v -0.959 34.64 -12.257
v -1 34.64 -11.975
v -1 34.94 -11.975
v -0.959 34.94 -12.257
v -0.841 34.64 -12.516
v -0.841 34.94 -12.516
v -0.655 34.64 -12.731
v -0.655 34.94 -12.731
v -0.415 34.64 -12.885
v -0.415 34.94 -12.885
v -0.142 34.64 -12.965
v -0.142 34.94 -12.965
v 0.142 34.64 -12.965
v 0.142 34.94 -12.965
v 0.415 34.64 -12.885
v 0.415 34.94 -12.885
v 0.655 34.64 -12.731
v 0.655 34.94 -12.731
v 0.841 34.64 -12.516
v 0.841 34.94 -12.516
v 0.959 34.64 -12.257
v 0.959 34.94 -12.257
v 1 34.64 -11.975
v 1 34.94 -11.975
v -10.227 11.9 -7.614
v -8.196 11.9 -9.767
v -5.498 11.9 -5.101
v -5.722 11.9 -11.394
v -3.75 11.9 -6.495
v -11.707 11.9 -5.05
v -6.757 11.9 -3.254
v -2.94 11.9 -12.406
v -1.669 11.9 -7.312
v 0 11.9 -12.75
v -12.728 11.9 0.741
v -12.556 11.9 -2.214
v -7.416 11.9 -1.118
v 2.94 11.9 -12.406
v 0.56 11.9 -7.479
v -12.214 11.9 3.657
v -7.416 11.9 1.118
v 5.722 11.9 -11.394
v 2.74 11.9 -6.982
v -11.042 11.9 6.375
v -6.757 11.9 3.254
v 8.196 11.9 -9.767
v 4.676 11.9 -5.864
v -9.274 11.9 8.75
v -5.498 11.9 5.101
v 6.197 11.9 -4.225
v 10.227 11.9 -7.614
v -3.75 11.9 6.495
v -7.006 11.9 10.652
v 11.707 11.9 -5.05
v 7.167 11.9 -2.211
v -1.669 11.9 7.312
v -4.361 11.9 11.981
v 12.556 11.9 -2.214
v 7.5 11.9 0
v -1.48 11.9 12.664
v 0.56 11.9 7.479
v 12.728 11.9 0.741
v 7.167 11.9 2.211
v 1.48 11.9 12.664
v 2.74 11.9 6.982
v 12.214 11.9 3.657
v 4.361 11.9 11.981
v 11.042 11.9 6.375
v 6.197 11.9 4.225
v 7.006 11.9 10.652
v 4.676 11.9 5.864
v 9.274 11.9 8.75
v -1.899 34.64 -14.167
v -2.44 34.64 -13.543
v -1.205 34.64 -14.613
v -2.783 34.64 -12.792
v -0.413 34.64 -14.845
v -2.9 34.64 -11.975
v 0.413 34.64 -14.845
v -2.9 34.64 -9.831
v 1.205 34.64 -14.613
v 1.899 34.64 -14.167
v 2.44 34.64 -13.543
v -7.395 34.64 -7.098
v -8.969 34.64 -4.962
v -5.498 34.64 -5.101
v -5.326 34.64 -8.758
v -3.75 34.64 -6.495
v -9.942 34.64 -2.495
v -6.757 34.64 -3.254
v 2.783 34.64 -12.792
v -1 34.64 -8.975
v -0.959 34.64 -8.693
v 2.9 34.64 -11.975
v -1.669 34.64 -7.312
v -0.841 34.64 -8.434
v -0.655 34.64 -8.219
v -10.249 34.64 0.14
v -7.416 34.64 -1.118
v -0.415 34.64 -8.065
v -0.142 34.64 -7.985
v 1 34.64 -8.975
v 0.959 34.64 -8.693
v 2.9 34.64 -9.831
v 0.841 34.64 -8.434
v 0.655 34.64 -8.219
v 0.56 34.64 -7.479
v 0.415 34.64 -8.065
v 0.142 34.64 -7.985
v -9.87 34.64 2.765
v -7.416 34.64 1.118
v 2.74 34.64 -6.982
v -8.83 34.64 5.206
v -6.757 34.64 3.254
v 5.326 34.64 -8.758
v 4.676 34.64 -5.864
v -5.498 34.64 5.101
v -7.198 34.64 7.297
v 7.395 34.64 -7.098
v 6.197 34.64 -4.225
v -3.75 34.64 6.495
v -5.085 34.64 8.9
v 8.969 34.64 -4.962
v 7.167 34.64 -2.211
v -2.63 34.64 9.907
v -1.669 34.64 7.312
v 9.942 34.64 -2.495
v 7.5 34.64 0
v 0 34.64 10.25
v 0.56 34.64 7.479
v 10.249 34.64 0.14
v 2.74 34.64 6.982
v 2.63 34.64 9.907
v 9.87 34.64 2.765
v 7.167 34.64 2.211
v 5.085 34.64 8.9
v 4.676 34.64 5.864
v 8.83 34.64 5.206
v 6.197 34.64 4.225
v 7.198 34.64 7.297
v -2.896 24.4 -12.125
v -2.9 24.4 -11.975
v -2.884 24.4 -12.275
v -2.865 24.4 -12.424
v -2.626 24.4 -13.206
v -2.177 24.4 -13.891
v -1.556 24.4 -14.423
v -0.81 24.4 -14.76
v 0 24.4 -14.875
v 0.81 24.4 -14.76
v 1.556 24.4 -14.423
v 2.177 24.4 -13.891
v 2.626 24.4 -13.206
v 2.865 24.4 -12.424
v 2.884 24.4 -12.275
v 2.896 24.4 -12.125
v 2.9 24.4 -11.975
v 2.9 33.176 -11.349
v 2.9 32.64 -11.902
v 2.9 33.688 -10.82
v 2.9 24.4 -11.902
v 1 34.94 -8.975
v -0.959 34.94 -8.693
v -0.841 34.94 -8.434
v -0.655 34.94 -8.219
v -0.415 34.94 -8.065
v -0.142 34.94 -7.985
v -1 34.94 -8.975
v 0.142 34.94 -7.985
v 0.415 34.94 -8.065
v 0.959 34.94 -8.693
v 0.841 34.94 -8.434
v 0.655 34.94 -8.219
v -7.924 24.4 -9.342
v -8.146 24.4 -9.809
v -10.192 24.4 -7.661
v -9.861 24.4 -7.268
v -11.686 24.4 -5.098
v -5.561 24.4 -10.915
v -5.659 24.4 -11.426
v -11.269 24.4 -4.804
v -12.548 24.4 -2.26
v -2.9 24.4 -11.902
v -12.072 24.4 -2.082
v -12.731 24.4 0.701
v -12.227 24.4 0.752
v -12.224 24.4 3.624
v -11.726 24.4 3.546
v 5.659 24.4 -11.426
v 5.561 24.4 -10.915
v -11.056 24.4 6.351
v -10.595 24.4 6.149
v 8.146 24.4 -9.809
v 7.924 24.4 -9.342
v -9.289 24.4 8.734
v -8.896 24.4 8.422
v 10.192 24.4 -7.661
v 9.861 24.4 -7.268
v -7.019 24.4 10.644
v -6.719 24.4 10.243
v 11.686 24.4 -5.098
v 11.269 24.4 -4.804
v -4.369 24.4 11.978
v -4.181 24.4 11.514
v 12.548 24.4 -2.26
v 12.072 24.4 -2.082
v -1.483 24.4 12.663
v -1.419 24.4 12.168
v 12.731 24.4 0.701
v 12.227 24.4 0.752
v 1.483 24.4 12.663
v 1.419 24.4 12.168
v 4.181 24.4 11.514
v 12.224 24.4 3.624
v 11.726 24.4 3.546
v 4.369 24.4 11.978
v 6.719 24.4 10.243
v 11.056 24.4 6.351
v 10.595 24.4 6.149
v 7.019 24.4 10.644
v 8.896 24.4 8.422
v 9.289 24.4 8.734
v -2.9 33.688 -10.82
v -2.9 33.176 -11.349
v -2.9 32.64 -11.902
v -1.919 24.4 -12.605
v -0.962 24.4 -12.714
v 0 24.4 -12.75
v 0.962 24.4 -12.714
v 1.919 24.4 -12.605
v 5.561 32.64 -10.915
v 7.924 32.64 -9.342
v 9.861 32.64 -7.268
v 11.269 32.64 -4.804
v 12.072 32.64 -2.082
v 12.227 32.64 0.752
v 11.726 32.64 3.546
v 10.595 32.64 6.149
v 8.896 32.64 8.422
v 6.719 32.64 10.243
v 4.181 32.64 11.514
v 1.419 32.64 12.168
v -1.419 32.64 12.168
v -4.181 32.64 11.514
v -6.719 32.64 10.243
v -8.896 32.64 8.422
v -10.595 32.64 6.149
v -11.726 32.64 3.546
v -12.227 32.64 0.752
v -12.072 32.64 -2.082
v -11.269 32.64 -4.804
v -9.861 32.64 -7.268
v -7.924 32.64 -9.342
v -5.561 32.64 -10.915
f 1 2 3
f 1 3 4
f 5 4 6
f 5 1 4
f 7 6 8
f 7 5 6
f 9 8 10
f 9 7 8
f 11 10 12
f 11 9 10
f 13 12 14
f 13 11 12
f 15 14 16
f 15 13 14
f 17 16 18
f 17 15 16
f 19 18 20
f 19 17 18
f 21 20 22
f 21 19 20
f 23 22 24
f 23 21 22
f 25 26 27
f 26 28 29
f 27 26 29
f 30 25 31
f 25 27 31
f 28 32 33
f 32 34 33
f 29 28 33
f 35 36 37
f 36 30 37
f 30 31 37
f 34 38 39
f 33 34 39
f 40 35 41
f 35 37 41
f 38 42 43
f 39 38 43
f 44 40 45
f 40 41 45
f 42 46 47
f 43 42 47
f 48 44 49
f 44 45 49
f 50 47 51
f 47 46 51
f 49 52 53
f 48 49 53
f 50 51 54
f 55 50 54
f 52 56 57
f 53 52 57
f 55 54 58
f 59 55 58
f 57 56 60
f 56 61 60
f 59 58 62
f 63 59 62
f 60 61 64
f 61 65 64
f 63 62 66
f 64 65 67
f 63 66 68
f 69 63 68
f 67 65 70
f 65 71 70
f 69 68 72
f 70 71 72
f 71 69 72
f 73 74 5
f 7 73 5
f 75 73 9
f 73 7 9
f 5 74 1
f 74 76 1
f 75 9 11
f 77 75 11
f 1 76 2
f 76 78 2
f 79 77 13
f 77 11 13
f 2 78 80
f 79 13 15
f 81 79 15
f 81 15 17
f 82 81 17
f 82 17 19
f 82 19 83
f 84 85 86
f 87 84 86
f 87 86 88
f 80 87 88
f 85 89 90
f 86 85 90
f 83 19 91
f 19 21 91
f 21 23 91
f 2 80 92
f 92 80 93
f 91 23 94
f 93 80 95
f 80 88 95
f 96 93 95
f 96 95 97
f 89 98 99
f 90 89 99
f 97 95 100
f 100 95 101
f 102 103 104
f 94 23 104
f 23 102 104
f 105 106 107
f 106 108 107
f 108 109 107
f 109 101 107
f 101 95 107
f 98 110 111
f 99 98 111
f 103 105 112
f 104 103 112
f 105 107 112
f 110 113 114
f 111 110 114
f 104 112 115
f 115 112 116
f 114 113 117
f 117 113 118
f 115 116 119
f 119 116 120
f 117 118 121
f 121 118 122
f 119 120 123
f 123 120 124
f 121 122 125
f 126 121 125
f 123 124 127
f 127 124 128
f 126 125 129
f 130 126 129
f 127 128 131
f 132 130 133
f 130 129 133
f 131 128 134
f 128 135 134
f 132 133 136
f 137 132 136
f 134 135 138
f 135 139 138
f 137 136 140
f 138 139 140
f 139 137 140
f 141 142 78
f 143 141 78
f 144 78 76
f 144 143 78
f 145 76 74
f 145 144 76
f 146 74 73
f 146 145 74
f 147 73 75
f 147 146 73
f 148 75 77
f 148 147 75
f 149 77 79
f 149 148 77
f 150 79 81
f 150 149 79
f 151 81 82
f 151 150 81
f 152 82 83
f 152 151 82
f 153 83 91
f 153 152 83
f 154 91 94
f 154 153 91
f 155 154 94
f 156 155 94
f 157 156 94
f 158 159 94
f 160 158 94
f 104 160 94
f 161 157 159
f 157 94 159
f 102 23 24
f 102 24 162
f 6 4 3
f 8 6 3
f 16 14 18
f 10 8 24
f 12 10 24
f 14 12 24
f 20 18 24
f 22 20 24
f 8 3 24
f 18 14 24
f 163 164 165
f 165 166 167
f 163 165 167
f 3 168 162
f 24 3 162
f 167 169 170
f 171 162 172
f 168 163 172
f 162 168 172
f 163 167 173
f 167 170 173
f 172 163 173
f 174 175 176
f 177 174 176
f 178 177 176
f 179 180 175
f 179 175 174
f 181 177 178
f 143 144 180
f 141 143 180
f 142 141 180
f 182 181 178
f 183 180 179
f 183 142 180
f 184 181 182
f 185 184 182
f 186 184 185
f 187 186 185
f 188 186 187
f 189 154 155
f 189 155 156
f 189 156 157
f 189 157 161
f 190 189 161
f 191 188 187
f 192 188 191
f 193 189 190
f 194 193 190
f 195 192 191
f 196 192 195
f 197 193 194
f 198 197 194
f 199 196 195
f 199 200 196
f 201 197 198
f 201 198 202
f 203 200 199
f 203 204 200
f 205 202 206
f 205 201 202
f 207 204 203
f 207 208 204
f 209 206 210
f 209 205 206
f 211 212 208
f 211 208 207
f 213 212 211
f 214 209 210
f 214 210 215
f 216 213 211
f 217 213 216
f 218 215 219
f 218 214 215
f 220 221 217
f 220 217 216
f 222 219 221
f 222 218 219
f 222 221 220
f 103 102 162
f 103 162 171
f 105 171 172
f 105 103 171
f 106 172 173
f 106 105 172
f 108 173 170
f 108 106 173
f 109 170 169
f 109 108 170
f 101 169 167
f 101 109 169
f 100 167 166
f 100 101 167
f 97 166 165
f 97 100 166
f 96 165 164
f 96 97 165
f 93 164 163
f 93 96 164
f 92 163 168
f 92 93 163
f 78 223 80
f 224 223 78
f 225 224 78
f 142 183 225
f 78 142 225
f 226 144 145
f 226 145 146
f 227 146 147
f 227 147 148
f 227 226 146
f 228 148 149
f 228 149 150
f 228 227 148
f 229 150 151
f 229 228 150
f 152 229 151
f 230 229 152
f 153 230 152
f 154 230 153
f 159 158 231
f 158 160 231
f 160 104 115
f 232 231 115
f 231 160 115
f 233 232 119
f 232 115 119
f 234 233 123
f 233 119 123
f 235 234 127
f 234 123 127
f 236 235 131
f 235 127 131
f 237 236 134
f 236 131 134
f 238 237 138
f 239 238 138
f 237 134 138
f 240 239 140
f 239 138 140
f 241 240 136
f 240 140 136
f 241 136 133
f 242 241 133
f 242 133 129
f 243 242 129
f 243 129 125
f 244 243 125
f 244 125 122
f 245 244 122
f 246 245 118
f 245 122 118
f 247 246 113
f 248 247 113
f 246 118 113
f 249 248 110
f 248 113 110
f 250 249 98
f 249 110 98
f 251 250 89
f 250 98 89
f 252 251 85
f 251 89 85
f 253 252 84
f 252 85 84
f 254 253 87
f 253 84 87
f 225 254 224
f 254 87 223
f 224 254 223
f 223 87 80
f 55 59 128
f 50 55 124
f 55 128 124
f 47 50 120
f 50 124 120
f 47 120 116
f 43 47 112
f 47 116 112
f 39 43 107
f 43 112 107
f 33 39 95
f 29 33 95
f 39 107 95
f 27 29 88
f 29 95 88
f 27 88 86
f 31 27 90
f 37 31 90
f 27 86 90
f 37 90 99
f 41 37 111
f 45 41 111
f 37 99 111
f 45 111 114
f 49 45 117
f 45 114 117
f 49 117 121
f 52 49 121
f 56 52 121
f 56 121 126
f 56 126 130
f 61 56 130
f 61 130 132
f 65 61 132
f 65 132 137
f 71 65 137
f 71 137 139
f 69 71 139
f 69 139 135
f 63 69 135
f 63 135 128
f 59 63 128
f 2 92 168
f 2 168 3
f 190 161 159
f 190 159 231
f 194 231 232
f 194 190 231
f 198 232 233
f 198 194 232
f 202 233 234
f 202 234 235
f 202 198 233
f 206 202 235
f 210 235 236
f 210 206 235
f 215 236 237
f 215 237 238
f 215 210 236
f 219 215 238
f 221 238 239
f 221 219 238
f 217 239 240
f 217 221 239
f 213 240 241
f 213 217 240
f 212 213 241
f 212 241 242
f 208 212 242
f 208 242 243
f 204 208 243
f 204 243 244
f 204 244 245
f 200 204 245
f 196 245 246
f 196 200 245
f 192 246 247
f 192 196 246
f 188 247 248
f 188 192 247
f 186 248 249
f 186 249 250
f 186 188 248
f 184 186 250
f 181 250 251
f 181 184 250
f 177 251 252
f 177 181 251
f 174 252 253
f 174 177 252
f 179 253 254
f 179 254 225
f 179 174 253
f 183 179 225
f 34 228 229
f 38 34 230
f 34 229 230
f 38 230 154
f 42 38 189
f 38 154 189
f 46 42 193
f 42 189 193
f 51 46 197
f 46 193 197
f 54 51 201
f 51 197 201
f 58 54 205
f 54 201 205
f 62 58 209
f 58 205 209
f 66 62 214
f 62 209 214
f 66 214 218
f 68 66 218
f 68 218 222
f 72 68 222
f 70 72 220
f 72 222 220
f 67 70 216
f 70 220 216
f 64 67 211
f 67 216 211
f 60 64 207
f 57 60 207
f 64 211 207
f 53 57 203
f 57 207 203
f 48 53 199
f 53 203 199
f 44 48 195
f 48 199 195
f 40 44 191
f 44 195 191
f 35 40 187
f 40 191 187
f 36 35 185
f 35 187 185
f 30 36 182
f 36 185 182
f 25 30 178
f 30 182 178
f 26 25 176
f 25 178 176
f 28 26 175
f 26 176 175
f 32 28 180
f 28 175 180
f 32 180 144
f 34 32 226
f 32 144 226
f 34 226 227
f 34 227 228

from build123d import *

# Parameters (mm, degrees)
SKETCH1_W                      = 12.75
SKETCH1_H                      = 12.5
BOSS_EXTRUDE1_DEPTH            = 10.24
BOSS_EXTRUDE2_DEPTH            = 0.3
F_15_0_15_DIAMETER_HOLE1_D     = 15
F_15_0_15_DIAMETER_HOLE1_DEPTH = 23.04
CHAMFER1_SIZE                  = 2


with BuildPart() as part:
    # Sketch1 → Revolve1 (revolve)
    with BuildSketch(Plane.XY, mode=Mode.PRIVATE) as revolve1_sk:
        with Locations((6.375, 18.15)):
            Rectangle(SKETCH1_W, SKETCH1_H)
    revolve(revolve1_sk.sketch.rotate(Axis((0, 24.4, 0), (0, -1, 0)), 270), axis=Axis((0, 24.4, 0), (0, -1, 0)))

    # Sketch2 → Boss-Extrude1 (add)
    with BuildSketch(Plane(origin=(0, 24.4, 0), x_dir=(-1, 0, 0), z_dir=(0, 1, 0))):
        with BuildLine():
            Line((2.9, -11.90178558), (2.9, -11.975))
            ThreePointArc((2.9, -11.975), (0, -14.875), (-2.9, -11.975))
            Line((-2.9, -11.975), (-2.9, -11.90178558))
            ThreePointArc((-2.9, -11.90178558), (0, 12.25), (2.9, -11.90178558))
        make_face()
    extrude(amount=BOSS_EXTRUDE1_DEPTH)

    # Sketch3 → Boss-Extrude2 (add)
    with BuildSketch(Plane(origin=(0, 34.64, 0), x_dir=(-1, 0, 0), z_dir=(0, 1, 0))):
        with BuildLine():
            Line((1, -8.975), (1, -11.975))
            ThreePointArc((1, -11.975), (0, -12.975), (-1, -11.975))
            Line((-1, -11.975), (-1, -8.975))
            ThreePointArc((-1, -8.975), (0, -7.975), (1, -8.975))
        make_face()
    extrude(amount=BOSS_EXTRUDE2_DEPTH)

    # Ø15.0 (15) Diameter Hole1
    with Locations(Plane(origin=(0, 11.9, 0), x_dir=(-1, 0, 0), z_dir=(0, -1, 0))):
        with Locations((0, 0)):
            Hole(F_15_0_15_DIAMETER_HOLE1_D / 2, depth=F_15_0_15_DIAMETER_HOLE1_DEPTH)

    # Chamfer1
    chamfer1_edges = [part.edges().sort_by_distance(p)[0] for p in [
        (0, 34.64, 12.25),
    ]]
    chamfer(chamfer1_edges, length=CHAMFER1_SIZE)


solid = part.part
